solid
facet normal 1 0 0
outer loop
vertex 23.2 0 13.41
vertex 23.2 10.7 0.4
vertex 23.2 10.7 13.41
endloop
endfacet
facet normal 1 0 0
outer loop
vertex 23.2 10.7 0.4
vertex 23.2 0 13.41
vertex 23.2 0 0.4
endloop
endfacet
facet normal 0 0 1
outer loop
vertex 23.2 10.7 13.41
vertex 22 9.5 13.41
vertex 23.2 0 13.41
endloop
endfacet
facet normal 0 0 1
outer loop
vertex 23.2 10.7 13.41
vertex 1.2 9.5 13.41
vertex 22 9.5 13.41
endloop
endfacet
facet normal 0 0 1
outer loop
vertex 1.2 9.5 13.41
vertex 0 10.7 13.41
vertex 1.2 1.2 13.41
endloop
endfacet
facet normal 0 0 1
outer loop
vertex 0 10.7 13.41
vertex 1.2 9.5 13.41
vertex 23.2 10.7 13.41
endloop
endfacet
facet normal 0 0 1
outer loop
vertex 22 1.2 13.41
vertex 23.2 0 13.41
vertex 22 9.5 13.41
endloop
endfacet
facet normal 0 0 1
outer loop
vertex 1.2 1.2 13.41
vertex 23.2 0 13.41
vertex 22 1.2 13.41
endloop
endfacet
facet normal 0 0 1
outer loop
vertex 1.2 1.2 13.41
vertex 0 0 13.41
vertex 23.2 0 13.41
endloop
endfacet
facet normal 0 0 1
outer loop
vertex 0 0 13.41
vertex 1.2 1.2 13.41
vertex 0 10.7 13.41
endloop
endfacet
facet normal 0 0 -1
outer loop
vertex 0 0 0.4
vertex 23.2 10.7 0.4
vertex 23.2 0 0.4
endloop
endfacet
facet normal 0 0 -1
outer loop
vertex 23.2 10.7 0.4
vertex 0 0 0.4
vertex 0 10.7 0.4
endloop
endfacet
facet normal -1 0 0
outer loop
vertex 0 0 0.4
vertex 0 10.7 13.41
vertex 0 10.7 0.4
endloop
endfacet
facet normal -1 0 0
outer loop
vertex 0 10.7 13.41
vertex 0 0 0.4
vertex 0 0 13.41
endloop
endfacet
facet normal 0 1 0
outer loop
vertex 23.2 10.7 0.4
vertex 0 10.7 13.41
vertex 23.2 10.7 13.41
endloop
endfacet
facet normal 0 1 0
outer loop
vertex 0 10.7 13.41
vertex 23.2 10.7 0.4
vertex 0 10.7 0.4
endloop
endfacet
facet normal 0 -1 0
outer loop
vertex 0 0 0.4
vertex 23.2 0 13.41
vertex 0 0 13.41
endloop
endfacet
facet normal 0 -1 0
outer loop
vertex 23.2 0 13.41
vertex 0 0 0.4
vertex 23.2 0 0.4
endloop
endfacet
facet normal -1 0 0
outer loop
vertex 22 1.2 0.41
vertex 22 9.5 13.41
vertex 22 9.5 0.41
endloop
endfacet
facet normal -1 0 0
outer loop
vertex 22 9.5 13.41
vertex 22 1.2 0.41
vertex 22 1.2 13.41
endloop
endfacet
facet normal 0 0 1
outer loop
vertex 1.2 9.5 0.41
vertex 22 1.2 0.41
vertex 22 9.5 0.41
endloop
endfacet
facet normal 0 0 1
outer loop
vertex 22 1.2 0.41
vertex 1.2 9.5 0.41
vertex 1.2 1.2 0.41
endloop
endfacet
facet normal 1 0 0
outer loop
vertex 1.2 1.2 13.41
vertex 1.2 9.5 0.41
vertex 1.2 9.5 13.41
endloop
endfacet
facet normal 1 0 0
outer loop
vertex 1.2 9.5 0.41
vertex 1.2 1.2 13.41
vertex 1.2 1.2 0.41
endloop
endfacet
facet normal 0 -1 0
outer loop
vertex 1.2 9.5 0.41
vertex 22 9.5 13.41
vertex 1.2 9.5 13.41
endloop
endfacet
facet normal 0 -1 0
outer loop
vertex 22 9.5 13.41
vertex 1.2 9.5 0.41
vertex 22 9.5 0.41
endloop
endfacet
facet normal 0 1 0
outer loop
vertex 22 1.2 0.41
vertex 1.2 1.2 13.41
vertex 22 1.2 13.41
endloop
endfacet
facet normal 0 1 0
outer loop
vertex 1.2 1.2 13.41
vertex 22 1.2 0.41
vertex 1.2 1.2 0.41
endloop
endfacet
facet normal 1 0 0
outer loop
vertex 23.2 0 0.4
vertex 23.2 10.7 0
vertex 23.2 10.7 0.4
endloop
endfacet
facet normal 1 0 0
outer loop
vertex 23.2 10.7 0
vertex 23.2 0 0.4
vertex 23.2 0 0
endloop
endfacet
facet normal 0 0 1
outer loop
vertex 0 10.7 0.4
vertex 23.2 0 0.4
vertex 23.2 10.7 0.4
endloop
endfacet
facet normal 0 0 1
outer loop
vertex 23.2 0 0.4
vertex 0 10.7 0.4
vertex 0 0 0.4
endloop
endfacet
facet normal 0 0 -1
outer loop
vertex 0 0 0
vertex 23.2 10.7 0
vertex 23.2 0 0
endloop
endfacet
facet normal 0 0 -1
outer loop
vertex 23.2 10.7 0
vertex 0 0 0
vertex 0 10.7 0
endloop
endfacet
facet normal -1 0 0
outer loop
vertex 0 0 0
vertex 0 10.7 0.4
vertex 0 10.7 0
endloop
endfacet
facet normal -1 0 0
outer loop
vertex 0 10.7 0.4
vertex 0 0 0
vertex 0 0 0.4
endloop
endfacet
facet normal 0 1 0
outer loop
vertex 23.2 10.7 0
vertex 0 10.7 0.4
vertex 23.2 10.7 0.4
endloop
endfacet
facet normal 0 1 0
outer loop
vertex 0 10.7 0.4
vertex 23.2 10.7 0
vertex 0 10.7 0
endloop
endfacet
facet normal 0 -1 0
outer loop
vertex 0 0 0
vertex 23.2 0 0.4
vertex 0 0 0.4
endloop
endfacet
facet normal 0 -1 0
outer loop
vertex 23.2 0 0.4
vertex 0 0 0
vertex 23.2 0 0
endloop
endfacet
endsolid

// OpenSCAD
// file: ../../Base/Rotation.scad
// Fischertechnik Box Foundation
// Geometry Helpers Rotation

include <PlacementOptions.scad>

// getRotatedSpace(space, rotation=NoRotation)
// Rotates the space dependent on the specified rotation

function getRotatedSpace(space, rotation=NoRotation) = [
    (rotation == Rotate90 || rotation == Rotate270) ? space.y : space.x,
    (rotation == Rotate90 || rotation == Rotate270) ? space.x : space.y
];

// Rotates the given space around the fixed left lower corner
// space = the space the children needs as width/depth list [width,depth]
// rotation = 0 Rotate0 degrees, 1 Rotate90 degrees, 2 Rotate180 degrees, 3 Rotate270 degrees (equivalent to -90)

module RotateFix(space, rotation=NoRotation) {
    dy = (rotation == Rotate0 || rotation == Rotate270) ? 0 :
        (rotation == Rotate90) ? space.x :
        space.y;
    dx = (rotation < Rotate180) ? 0 :
        (rotation == Rotate180) ? space.x :
        space.y;
    
    translate([dx, dy, 0])
        rotate([0, 0, rotations[rotation]])
            children();
}
// file: ../../Base/Alignment.scad
// Fischertechnik Box Foundation
// Geometry Helpers Alignment

include <PlacementOptions.scad>

// getAlignedX(elementWidth, spaceWidth, align=AlignRight, offset=0)
// Gets the aligned X offset of an element with the given
// width in the given space.
// elementWidth = The width of the element to positon
// spaceWidth = The space where the element should be aligned
// align = 0 AlignLeft, 1 AlignCenter, 2 AlignRight
// offset = an optional offset from the aligned position. When
// aligned left or centered, then positive values are in X direction.
// When aligned right then positive values are in negative X direction.

function getAlignedX(elementWidth, spaceWidth, align=AlignRight, offset=0) =
    (align == AlignLeft) ?
        offset :
        ((align == AlignCenter) ?
        (spaceWidth - elementWidth)/2 + offset :
        spaceWidth - offset - elementWidth);

// getAlignedY(elementDepth, spaceDepth, align=AlignTop, offset=0)
// Gets the aligned Y offset of an element with the given
// depth in the given space.
// elementDepth = The depth of the element to positon
// spaceDepth = The space where the element should be aligned
// align = 0 AlignBottom, 1 AlignCenter, 2 AlignTop
// offset = an optional offset from the aligned position. When
// aligned bottom or centered, then positive values are in Y direction.
// When aligned top then positive values are in negative Y direction.

function getAlignedY(elementDepth, spaceDepth, align=AlignTop, offset=0) =
    (align == AlignBottom) ?
        offset :
        ((align == AlignCenter) ?
        (spaceDepth - elementDepth)/2 + offset :
        spaceDepth - offset - elementDepth);
// file: ../../Base/PlacementOptions.scad
// Fischertechnik Box Foundation
// Placement Options

// Alignment
NoAlign = 0;
AlignLeft = 1;
AlignBottom = 2;
AlignCenter = 3;
AlignRight = 4;
AlignTop = 5;

// Element rotation degree steps
rotations = [0, -90, -180, -270];

// Rotation
NoRotation = 0;
Rotate0 = 0;
Rotate90 = 1;
Rotate180 = 2;
Rotate270 = 3;

// Docking (seen from above)
NoDock = -1;
DockLeft = 0;
DockTop = 1;
DockRight = 2;
DockCorner = 2;
DockBottom = 3;

// Web corners
LowerLeft = 0;
UpperLeft = 1;
UpperRight = 2;
LowerRight = 3;

// Web position relative to corner
LeftOfCorner = 0;
RightOfCorner = 1;
// file: ../../Base/Boxes.scad
// Fischertechnik Box Foundation
// Pre-designed Boxes

use <Constants.scad>

include <PlacementOptions.scad>

box190Width = 190;
box190Depth = 130;
box130Width = 130;
box130Depth = 95;

// Values are from an original ec3 box
topBottomDifference = 1.5;
outerHeight = 40;
innerHeight = 38.2;
baseThickness = outerHeight - innerHeight;
stackExcess = 5.7;
radius = 3.5;
wallThickness = 1.5;
tolerance = 0.2;
stackOffset = innerHeight - stackExcess;

boxUsageHeight = stackOffset;
boxWallThickness = wallThickness;
boxBaseThickness = baseThickness;
boxWebWidth = 3.0;

// getBoxWallThickness()
// Gets the wall thickness of a Fischertechnik Box
function getBoxWallThickness() = boxWallThickness;

// getBoxUsageHeight()
// Gets the usable height of a Fischertechnik box
function getBoxUsageHeight() = boxUsageHeight;

// getBoxInnerHeight()
// Gets the inner height of a Fischertechnik box, including the stack excess
function getBoxInnerHeight() = innerHeight;

// getBoxBaseThickness()
// Gets the thickness of the Fischertechnik box base.
function getBoxBaseThickness() = boxBaseThickness;

// getBoxWebWidth()
// Gets the width of a box web
function getBoxWebWidth() = boxWebWidth;

// getBox190Space()
// Gets the usable inner space of a Box 190 as an x/y-list
function getBox190Space() = [
    box190Width - 2*getBoxWallThickness() - topBottomDifference, 
    box190Depth - 2*getBoxWallThickness() - topBottomDifference ];

// BoxBase(width, depth)
// Creates an empty stackable Fischertechnik compatible box
// width = Outer width of the box (190, 130, ...)
// depth = Outer depth of the box (130, 95, ...)

module BoxBase(width, depth, height=outerHeight) {    
    thinPlate = 0.01;

    innerHeight = height - baseThickness;    
    
    module BodyPlate(width, depth) {
        translate([radius, radius])
        hull() {
            w = width-2*radius;
            d = depth-2*radius;
            cube([w, d, thinPlate]);
            cylinder(thinPlate, r=radius, $fn=getFragments());
            translate([w, 0])
                cylinder(thinPlate, r=radius, $fn=getFragments());
            translate([w, d])
                cylinder(thinPlate, r=radius, $fn=getFragments());
            translate([0, d])
                cylinder(thinPlate, r=radius, $fn=getFragments());
        }
    }
    
    module Body(tolerance=tolerance) {
        hull() {
            // Bottom with tolerance to fit into the original boxes when stacked
            translate([-wallThickness+tolerance, -wallThickness+tolerance, -baseThickness])
                BodyPlate(width-topBottomDifference-2*tolerance, depth-topBottomDifference-2*tolerance);
            
            // Top
            translate([-wallThickness-topBottomDifference/2, -wallThickness-topBottomDifference/2, innerHeight-thinPlate])
                BodyPlate(width, depth);
         }
    }

    module Cutoff() {
        hull() {
            coWidth = width - 2*wallThickness;
            coDepth = depth - 2*wallThickness;
            
            // Bottom
            BodyPlate(coWidth-topBottomDifference, coDepth-topBottomDifference);

            // Top
            translate([-topBottomDifference/2, -topBottomDifference/2, innerHeight+thinPlate]) 
                BodyPlate(coWidth, coDepth);
        }
    }
    
    difference() {        
        Body();
        Cutoff();
        stackOffset = innerHeight - stackExcess;
        translate([0, 0, stackOffset + baseThickness])
            Body(tolerance=0);
    }
}

// Creates the Fischertechnik empty box 130x190 mm and places it at position 0,0
// 190x130 are the outer sizes, the inner space is slightly smaller. Use getBox190Space() to get the inner sizes.
// The box is positioned that the usable inner space is at the 0,0,0 position. The

module Box190() {
    BoxBase(box190Width, box190Depth);
}

// Gets the usable inner space of a Box 130 as an x/y-list
function getBox130Space() = [
    box130Width - 2*getBoxWallThickness() - topBottomDifference, 
    box130Depth - 2*getBoxWallThickness() - topBottomDifference ];

// Creates the Fischertechnik empty box 95x130 mm and places it at position 0,0
// 190x130 are the outer sizes, the inner space is slightly smaller. Use getBox190Space() to get the inner sizes.
// The box is positioned that the usable inner space is at the 0,0,0 position. The

module Box130() {
    BoxBase(box130Width, box130Depth);
}

// Creates a web at the specified box walls
// corner 0 = LowerLeft, 1 = UpperLeft, 2 = UpperRight, 3 = LowerRight
// side 0 = LeftOfCorner, 1 = RightOfCorner
// distance = Distance in mm from the corner
// boxSpace = inner width and depth of the box (default: Box 190)
// webWidth = length of the web (default is 3 mms)
// webThickness = thickness of the web (default is 1 mm)

module BoxWeb(corner, side, distance, boxSpace=getBox190Space(), webWidth=getBoxWebWidth(), webThickness=1.0) {
    sink = getBoxWallThickness()/2;

    width = (corner % 2 == 0) ? 
            (side == LeftOfCorner ? webWidth : webThickness) :
            (side == LeftOfCorner ? webThickness : webWidth);

    depth = (corner % 2 == 0) ? 
            (side == RightOfCorner ? webWidth : webThickness) :
            (side == RightOfCorner ? webThickness : webWidth);
    
    xDiff = corner == LowerLeft ? 
                (side == LeftOfCorner ? -sink : distance) :
            (corner == UpperLeft ?                
                (side == LeftOfCorner ? distance : -sink) :
            (corner == UpperRight ?
                (side == LeftOfCorner ? boxSpace.x-webWidth+sink : boxSpace.x-distance-webThickness) :
                (side == LeftOfCorner ? boxSpace.x-distance-webThickness: boxSpace.x-webWidth+sink)));

    yDiff = corner == LowerLeft ? 
                (side == RightOfCorner ? -sink : distance) :
            (corner == UpperLeft ?
                (side == RightOfCorner ? boxSpace.y-distance : boxSpace.y-webWidth+sink) :
            (corner == UpperRight ?
                (side == RightOfCorner ? boxSpace.y-webWidth+sink : boxSpace.y-distance) :
                (side == RightOfCorner ? distance : -sink)));
    
    translate([xDiff, yDiff, -getExcess()])
        cube([width, depth, boxUsageHeight + 2*getExcess()]);
}
// file: ../../Base/Placement.scad
// Fischertechnik Box Foundation
// Geometry Helpers Placement

use <Constants.scad>
use <Alignment.scad>
use <Rotation.scad>
use <Boxes.scad>

include <PlacementOptions.scad>

// Place(x=0, y=0, elementSpace=[0,0], alignX=AlignLeft, alignY=AlignBottom, rotation=Rotate0, boxSpace=getBox190Space())
// Places the child at the specified position
// y = Y-Position. This is a relative position when an X aligment is specified.
// x = X-Position. This is a relative position when an Y aligment is specified.
// elementSpace = space of the element to be placed [x,y]
// alignX = -1=NoAlign, 0 AlignLeft, 1 AlignCenter, 3 AlignRight (elementSpace and boxSpace required!)
// alignY = -1=NoAlign, 2 AlignBottom, 1 AlignCenter, 4 AlignTop (elementSpace and boxSpace required!)
// rotation = 0 Rotate0 0 degrees, 1 Rotate90 90 degrees, 
// 2 Rotate180 180 degrees, 3 Rotate270 270 degrees (equivalent to -90)
// boxSpace = Inner space of the box where the placement occurs [x,y] - default is Box 190x130 inner space

module Place(x=0, y=0, elementSpace=[0,0], 
  alignX=AlignLeft, alignY=AlignBottom, 
  rotation=NoRotation, boxSpace=getBox190Space()) {

    module Position(x, y, space, rotation=Rotate0) {
        translate([x, y, 0])
            RotateFix(space, rotation)
                children();
    }

    space = getRotatedSpace(elementSpace, rotation);
    alignedX = getAlignedX(space.x, boxSpace.x, alignX, x);
    alignedY = getAlignedY(space.y, boxSpace.y, alignY, y);
    Position(alignedX, alignedY, elementSpace, rotation)
        children();
}

// Center(space=getBox130Space(), elementSpace=[0,0])
// space = Space where the children is centered. For cylinder use centered=true and no elementSpace.
// elementSpace = space of the element to be centered [x,y]

module Center(space=getBox190Space(), elementSpace=[0,0]) {
    Place(elementSpace=elementSpace, boxSpace=space, alignX=AlignCenter, alignY=AlignCenter)
        children();
}

// CenterHorizontal(width=0, y=0, offset=0, space=getBox130Space())
// width = Width of the element to be placed.
// y = Y position of the element
// offset = Offset from the center position (negative will be left of the center)
// space = Space where the element is placed

module CenterHorizontal(width=0, y=0, offset=0, space=getBox190Space()) {
    Place(x=offset, y=y, elementSpace=[width, 0], boxSpace=space, alignX=AlignCenter)
        children(0);
}

// CenterVertical(depth=0, x=0, offset=0, space=getBox130Space())
// depth = Depth of the element to be placed.
// x = X position of the element
// offset = Offset from the center position (negative will be down of the center)
// space = Space where the element is placed

module CenterVertical(depth=0, x=0, offset=0, space=getBox190Space()) {
    Place(x=x, y=offset, elementSpace=[0, depth], boxSpace=space, alignY=AlignCenter)
        children(0);
}

// getIsVertical(align)
// True if the specified alignment needs a vertical orientation for a divider (AlignRight, AlignLeft)

function getIsVertical(align) = (align == AlignRight || align == AlignLeft);

// getIsHorizontal(align)
// True if the specified alignment needs a horizontal orientation for a divider (AlignTop, AlignBottom)

function getIsHorizontal(align) = (align == AlignTop || align == AlignBottom);
// file: ../../Elements/AxisClip10.scad
// Fischertechnik Box Library
// Axis for clip 10
// 31023

use <../ModelBase/Simple.scad>
use <../Base/Constants.scad>

width = 12;
depth = 12;
height = 23;
upperDiameter = 3.6;
clipHeight = 10;

// getAxisClip10Space()
// Gets the space of a frame for a clip 10 with spring ring (mot2)

function getAxisClip10Space() = [width, depth, height];

// AxisClip10(height, clipHeight)
// Axis for clip 10 with spring ring (mot2)
// height = Height of the complete axis
// clipHeight = Height of the rt for the clip (standard is 10, in mot3 its only 7)

module AxisClip10(height=height, clipHeight=clipHeight) {
    LeveledAxisWithSpace(height, height-clipHeight, getAxisClip10Space(), diameter=upperDiameter);
}

// Tests
color("lightgray")
AxisClip10();
// file: ../../Base/Constants.scad
// Fischertechnik Box Foundation
// Constants

// Constant values necessary for multiple elements

// Base constants
dividerThickness = 1.2;
excess = 0.01;
fragments = 90;
tolerance = 0.8;

// Gets the thickness of a divider 
function getDividerThickness() = dividerThickness;

// Gets the excess that is used to merge walls into each other
function getExcess() = excess;

// Gets amount of fragments of a cylinder
function getFragments() = fragments;

// Gets the inner tolerance of a frame to each side
function getTolerance() = tolerance;


// Fischertechnik specific constants
axisDiameter = 4;
axisBottomDiameter = axisDiameter + 1;
standardEdgeDistance = 2.5;
standardWebDistance = 11.5;
standardCornerLength = 15;
tubeWallFactor = 0.8;
smallPartsFrameHeight = 20;

// Gets axis diameter
function getAxisDiameter() = axisDiameter;

// Gets axis bottom diameter for thicker part at the bottom
function getAxisBottomDiameter() = axisBottomDiameter;

// gets the standard distance to the wall of the box for dockable frames with webs
function getStandardEdgeDistance() = standardEdgeDistance;

// gets the standard distance of each web to the corner of the dockable frame
function getStandardWebDistance() = standardWebDistance;

// gets the standard length of the corner walls of a dockable frame
function getStandardCornerLength() = standardCornerLength;

// gets the wall thickness of a tube.
function getTubeWallThickness() = tubeWallFactor * getDividerThickness();

// gets the frame height for docked small parts boxes.
function getSmallPartsFrameHeight() = smallPartsFrameHeight;
// file: ../../Elements/FrameLockingRing.scad
// Fischertechnik Box Library
// Frame for Locking Ring
// 31020

use <../Base/Constants.scad>
use <../ModelBase/Simple.scad>

width = 20;
depth = 7.5;
height = 13;

// getFrameLockingRingSpace(columns=1, rows=1)
// columns = Count of locking rings in X direction (width of ring)
// rows = Count of locking rings in Y direction (depth of ring)
// Gets the space the frame locking ring needs as width (.x and .y as a list)

function getFrameLockingRingSpace(columns=1, rows=1) = getFrameOuterVolume([width*columns, depth*rows, height]);

// FrameLockingRing(columns, rows, smallSideIsX)
// columns = Count of locking rings in X direction (width of ring)
// rows = Count of locking rings in Y direction (depth of ring)
// The walls of the frame are 13 mm high. The small side is 7.5 mm wide, the large side
// is 20 mm wide.

module FrameLockingRing(columns=1, rows=1) {
    Frame([width*columns, depth*rows, height]);
}

// Tests
color("lightgray")
    FrameLockingRing(1);
// file: ../TestPrint.scad
// 3D Print Test Base

use <../Base/Constants.scad>

use <../Elements/AxisClip10.scad>

module TestPrint(elementSpace) {
    cube([elementSpace.x, elementSpace.y, 0.4]);
    translate([0,0,0.4+getExcess()]) {
        children();
    }
}

TestPrint(getAxisClip10Space())
    AxisClip10();
// main file
// 3D Print Test
// FrameLockingRing

use <../TestPrint.scad>
use <../../Elements/FrameLockingRing.scad>

TestPrint(getFrameLockingRingSpace())
    FrameLockingRing();
